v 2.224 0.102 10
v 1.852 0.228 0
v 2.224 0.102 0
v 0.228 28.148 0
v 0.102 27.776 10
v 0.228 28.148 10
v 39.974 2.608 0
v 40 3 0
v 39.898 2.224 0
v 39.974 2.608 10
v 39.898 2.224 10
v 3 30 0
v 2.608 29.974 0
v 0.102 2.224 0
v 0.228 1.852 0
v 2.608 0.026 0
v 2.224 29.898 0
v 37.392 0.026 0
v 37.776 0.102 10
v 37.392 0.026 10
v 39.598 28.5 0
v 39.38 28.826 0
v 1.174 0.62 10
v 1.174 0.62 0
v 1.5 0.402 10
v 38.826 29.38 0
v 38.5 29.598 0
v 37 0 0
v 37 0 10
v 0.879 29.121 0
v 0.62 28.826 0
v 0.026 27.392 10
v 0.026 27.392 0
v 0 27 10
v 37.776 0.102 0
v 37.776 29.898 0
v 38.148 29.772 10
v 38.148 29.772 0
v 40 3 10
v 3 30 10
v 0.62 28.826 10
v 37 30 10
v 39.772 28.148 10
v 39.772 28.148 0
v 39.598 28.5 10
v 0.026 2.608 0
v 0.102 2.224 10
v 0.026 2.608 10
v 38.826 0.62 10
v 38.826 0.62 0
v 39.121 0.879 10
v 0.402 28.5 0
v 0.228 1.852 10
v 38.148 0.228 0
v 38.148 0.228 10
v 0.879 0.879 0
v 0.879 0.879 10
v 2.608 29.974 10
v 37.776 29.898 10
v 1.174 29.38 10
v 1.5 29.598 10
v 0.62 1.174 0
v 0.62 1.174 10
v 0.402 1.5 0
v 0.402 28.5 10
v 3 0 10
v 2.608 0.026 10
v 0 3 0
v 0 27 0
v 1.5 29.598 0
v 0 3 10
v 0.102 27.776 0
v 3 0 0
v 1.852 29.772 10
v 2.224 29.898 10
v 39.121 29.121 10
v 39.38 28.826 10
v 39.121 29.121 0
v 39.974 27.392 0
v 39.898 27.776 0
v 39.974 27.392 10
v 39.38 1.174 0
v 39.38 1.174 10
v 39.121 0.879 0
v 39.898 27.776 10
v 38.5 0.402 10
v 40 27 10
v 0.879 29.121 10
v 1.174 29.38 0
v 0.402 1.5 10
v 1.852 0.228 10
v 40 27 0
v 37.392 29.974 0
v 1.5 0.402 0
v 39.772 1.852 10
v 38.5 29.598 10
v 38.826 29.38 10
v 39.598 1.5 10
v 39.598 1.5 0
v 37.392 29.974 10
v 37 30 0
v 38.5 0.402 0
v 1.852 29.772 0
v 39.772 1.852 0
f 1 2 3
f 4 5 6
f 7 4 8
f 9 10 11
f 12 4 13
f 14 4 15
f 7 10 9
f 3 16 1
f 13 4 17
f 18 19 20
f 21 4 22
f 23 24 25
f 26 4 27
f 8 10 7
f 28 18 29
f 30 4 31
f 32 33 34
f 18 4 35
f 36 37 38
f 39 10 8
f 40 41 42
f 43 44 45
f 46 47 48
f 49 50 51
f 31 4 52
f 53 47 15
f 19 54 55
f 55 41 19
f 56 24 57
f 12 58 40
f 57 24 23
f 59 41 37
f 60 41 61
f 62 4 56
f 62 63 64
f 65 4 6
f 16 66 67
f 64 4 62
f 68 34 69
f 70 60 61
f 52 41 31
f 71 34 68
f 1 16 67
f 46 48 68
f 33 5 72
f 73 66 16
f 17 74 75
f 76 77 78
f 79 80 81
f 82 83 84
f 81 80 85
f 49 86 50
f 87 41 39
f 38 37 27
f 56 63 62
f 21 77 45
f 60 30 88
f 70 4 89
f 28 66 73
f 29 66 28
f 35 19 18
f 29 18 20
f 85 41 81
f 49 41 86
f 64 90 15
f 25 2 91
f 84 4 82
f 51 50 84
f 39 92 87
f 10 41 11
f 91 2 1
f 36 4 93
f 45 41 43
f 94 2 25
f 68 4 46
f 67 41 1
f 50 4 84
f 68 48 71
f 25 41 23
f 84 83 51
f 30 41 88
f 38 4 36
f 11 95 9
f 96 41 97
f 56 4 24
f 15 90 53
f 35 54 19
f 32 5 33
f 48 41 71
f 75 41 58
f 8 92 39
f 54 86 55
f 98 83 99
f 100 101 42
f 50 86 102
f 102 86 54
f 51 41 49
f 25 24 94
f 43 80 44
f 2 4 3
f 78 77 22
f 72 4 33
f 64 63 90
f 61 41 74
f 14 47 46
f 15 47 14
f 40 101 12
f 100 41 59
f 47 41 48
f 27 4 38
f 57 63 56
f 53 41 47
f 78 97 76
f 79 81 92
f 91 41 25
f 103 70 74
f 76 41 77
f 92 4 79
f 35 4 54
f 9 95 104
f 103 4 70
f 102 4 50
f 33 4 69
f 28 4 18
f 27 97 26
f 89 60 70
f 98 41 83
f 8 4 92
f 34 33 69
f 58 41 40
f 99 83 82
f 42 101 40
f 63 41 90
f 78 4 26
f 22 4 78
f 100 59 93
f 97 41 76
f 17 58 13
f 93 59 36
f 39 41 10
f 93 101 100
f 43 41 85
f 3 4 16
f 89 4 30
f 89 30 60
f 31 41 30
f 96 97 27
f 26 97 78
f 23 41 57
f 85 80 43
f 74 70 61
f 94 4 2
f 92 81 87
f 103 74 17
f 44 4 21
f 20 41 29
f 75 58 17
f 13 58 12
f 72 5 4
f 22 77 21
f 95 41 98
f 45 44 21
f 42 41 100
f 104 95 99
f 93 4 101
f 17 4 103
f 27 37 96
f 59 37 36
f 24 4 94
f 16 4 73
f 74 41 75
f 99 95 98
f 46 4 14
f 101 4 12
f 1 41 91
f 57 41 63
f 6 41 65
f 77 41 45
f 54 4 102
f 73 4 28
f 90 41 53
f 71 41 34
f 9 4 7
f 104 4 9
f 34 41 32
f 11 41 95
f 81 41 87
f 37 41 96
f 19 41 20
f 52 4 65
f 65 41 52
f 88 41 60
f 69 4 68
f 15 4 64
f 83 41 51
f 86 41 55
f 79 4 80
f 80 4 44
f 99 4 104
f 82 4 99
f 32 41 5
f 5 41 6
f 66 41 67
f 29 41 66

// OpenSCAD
// file: ../lib/helpers.scad
// ============================================================
// <PROJECT NAME>  |  Shared geometry helpers
// ------------------------------------------------------------
// lib/ holds building blocks that have NO printed part of their own:
// shapes, profiles, joints, and functions reused by several parts.
// Parts reach this file with `use <../lib/helpers.scad>` (modules and
// functions only -- never its top-level variables).
//
// RULES FOR EVERY HELPER (docs/conventions/geometry.md):
//   - Build tapered/rounded solids with hull() of true primitives, not
//     rotate() + linear_extrude(): floating-point rotations are a common
//     source of "not a valid 2-manifold" errors.
//   - Give every module/function a DISTINCTIVE name. The MakerWorld bundle
//     is one flat file where the LAST definition of a name wins silently,
//     including names from bundled libraries (BOSL2 defines e.g. cuboid,
//     dovetail, rounded_prism). Prefix or qualify: rounded_block, not box.
//   - Document the argument contract (units, origin) in a comment above.
//
// REPLACE ME: delete rounded_block() if you do not need it, and add your
// own helpers. Remember: a new lib/ file must also be added to
// SOURCE_FILES in scripts/project_config.sh.
// ============================================================

// A box with rounded vertical edges, authored from its outer
// front-left-bottom corner at the origin (docs/conventions/geometry.md).
//   size : [x, y, z] outer dimensions, mm
//   r    : vertical-edge radius, mm (0 = plain cube)
module rounded_block(size, r = 0) {
    if (r <= 0) {
        cube(size);
    } else {
        hull() {
            for (x = [r, size[0] - r], y = [r, size[1] - r])
                translate([x, y, 0])
                    cylinder(h = size[2], r = r);
        }
    }
}
// file: ../lib/params.scad
// ============================================================
// <PROJECT NAME>  |  Global parameters  (SINGLE SOURCE OF TRUTH)
// ------------------------------------------------------------
// Every other .scad file does `include <../lib/params.scad>` to read these
// variables. Nothing downstream redefines or recomputes them.
//
// THIS FILE IS ALSO THE MAKERWORLD CUSTOMIZER UI. PMM follows the OpenSCAD
// Customizer syntax (docs/openscad/customizer-syntax.md):
//   /* [TAB NAME] */            starts a tab; parameters below belong to it
//   // Help text               the comment line ABOVE a parameter is its
//                              label/help text in the UI
//   x = 10; // [1:0.5:50]      slider: [min:step:max]
//   s = "a"; // [a:Label A, b:Label B]    dropdown (value:Label pairs)
//   flag = true;               checkbox (plain boolean)
//   c = "#FF6600"; // color    PMM color picker -- HEX string ONLY
//   f = "Roboto"; // font      PMM font picker -- name must be in the
//                              INSTALLED inventory (docs/pmm/data/)
//   /* [Hidden] */             everything below is invisible in the UI
//
// GENERATED TABLES: the README and listing parameter tables are built from
// this file (PARAM_TABLES, scripts/project_config.sh). Two optional lines
// ABOVE a parameter's help line feed the customer table only -- the
// customizer reads just the line directly above, and the MakerWorld build
// strips these:
//   // @label: Length            label in the listing (default: the name)
//   // @note: Only with X on     the listing's Compatibility column
//
// BUILD COUPLING (scripts/build/Bundle.psm1): in the MakerWorld bundle,
// comments in every tab EXCEPT [Hidden] are kept verbatim (they are the
// UI help text); comments under [Hidden] are stripped. Write user-facing
// comments for customers, and [Hidden] comments for maintainers.
//
// ORDER OF SECTIONS -- keep it:
//   1. user-facing tabs     (what a MakerWorld customer changes)
//   2. [Hidden] constants   (fixed design values)
//   3. [Hidden] derived     (computed ONCE here, read everywhere)
//
// `mw_plate_size` and `mw_assembly_views` live in scripts/plates_config.sh;
// their lines in the [Hidden] section are placeholders the build rewrites
// in place (see "Build-injected values" below).
//
// See: docs/workflows/add-a-parameter.md, docs/conventions/naming.md
// ============================================================

/* [DIMENSIONS] */

// REPLACE ME -- Overall length (X), in mm
size_x = 40; // [10:1:200]

// REPLACE ME -- Overall depth (Y), in mm
size_y = 30; // [10:1:200]

// REPLACE ME -- Overall height (Z), in mm
size_z = 10; // [2:0.5:100]

/* [OPTIONS] */

// REPLACE ME -- Example checkbox: round the vertical edges
rounded = true;

/* [CLEARANCES - TUNE FOR YOUR PRINTER] */

// Gap added to every mating cavity (mm). Nominal parts are never shrunk.
fit_clearance = 0.15; // [0:0.05:0.6]

/* [Hidden] */

// ---- Fixed design constants (not customer-facing) ----
corner_radius = 3;

// ---- Visualization colors (local previews only) ----
// Named colors are fine HERE because these are never exposed to the PMM UI.
// The MakerWorld build flattens color(<variable>) calls to one uniform hex
// (scripts/project_config.sh FLATTEN_COLORS). A color you DO expose to
// customers must be a hex string with a trailing `// color` comment.
part_color = "SteelBlue";

// ---- Build-injected values (placeholders) ----
// Their real values come from scripts/plates_config.sh (MW_PLATE_SIZE,
// ASSEMBLY_PLATE_VIEWS): the build REWRITES these two lines in place in both
// bundles. Declared here, before the derived values, so derived values can
// use them (OpenSCAD evaluates top-level assignments in order: a variable
// assigned further down reads as undef), and so standalone previews of
// single files work. Keep them in step with plates_config.sh.
mw_plate_size = 235;
mw_assembly_views = ["main"];

// ---- Layout spacing ----
// Clear space between consecutive assembled views' bounding boxes on the
// assembly preview plate (mw_assembly_view()). WHICH views appear is not set
// here: `mw_assembly_views` is injected by the build from
// scripts/plates_config.sh ASSEMBLY_PLATE_VIEWS, like mw_plate_size.
assembly_view_gap = 30;

// ---- Render quality ----
// Defaults match what PMM renders. The dev bundle and render pipeline
// override these; keep them as plain `$fa = N;` / `$fs = N;` lines.
$fa = 2;
$fs = 0.4;

// ---- Derived values (single source of truth) ----
// Compute here, once, as plain top-level variables. Never recompute a
// derived value inside a part file -- read it from here instead.
effective_radius = rounded ? min(corner_radius, size_x / 2, size_y / 2) : 0;

// ---- Telling the customer about adjusted values ----
// When a derived value clamps what the customer asked for, say so: the
// NOTE shows in PMM's and OpenSCAD's console. Echo EXPRESSIONS inside an
// assignment, not top-level `if (...) echo(...)` statements -- lint rule
// P12 counts top-level statements as geometry next to the mw_plate_N()
// modules. One param_note() per adjustment; the list itself is unused.
// (docs/conventions/geometry.md, "Clamp, then say so")
function param_note(adjusted, msg) = adjusted ? echo(str("NOTE: ", msg)) true : false;
param_notes = [
    param_note(rounded && effective_radius < corner_radius,
        str("corner radius reduced to ", effective_radius, " mm to fit the size")),
];
// main file
// ============================================================
// <PROJECT NAME>  |  Part: part_template   (COPY ME for each new part)
// ------------------------------------------------------------
// ONE FILE = ONE PRINTED PART. To add a part (docs/workflows/add-a-part.md):
//   1. copy this file to parts/<part_name>.scad
//   2. rename the module to EXACTLY <part_name> -- the plate validator
//      counts calls to a module named like the file
//   3. add the file to SOURCE_FILES (scripts/project_config.sh)
//   4. place it on a plate: scripts/plates_config.sh AND the matching
//      mw_plate_N() in assembly/assembly_main.scad (the build fails if
//      the two disagree)
//   5. document it: README "Parts to print" table, CHANGELOG [Unreleased]
//
// CONVENTIONS (docs/conventions/geometry.md):
//   - Author the part with its outer FRONT-LEFT-BOTTOM corner at (0,0,0)
//     (a part of revolution may be centered on its axis instead; say so),
//     in its PRINT orientation (flat face down, support-free if possible).
//     Assembly files rotate/translate it into its assembled pose.
//   - Clearances WIDEN THE CAVITY, never shrink the nominal part.
//   - Keep deliberate small overlaps (+0.01..+1) on cuts to avoid
//     coincident faces; comment why each one is there.
// ============================================================

include <../lib/params.scad>   // include: we need its VARIABLES

use <../lib/helpers.scad>      // use: modules/functions only

// REPLACE ME -- the whole body of this module is a placeholder.
// Arguments default to params.scad values so callers can override for
// variants without touching the customizer.
module part_template(size = [size_x, size_y, size_z], r = effective_radius) {
    rounded_block(size, r);
}

// BUILD:EXCLUDE-START (standalone preview only; stripped from every bundle)
// Lets you open THIS file directly in OpenSCAD (and lets render.sh and the
// smoke check export it). Anything a standalone preview needs that the
// build normally injects -- e.g. mw_plate_size -- is defined here.
part_template();
// BUILD:EXCLUDE-END
